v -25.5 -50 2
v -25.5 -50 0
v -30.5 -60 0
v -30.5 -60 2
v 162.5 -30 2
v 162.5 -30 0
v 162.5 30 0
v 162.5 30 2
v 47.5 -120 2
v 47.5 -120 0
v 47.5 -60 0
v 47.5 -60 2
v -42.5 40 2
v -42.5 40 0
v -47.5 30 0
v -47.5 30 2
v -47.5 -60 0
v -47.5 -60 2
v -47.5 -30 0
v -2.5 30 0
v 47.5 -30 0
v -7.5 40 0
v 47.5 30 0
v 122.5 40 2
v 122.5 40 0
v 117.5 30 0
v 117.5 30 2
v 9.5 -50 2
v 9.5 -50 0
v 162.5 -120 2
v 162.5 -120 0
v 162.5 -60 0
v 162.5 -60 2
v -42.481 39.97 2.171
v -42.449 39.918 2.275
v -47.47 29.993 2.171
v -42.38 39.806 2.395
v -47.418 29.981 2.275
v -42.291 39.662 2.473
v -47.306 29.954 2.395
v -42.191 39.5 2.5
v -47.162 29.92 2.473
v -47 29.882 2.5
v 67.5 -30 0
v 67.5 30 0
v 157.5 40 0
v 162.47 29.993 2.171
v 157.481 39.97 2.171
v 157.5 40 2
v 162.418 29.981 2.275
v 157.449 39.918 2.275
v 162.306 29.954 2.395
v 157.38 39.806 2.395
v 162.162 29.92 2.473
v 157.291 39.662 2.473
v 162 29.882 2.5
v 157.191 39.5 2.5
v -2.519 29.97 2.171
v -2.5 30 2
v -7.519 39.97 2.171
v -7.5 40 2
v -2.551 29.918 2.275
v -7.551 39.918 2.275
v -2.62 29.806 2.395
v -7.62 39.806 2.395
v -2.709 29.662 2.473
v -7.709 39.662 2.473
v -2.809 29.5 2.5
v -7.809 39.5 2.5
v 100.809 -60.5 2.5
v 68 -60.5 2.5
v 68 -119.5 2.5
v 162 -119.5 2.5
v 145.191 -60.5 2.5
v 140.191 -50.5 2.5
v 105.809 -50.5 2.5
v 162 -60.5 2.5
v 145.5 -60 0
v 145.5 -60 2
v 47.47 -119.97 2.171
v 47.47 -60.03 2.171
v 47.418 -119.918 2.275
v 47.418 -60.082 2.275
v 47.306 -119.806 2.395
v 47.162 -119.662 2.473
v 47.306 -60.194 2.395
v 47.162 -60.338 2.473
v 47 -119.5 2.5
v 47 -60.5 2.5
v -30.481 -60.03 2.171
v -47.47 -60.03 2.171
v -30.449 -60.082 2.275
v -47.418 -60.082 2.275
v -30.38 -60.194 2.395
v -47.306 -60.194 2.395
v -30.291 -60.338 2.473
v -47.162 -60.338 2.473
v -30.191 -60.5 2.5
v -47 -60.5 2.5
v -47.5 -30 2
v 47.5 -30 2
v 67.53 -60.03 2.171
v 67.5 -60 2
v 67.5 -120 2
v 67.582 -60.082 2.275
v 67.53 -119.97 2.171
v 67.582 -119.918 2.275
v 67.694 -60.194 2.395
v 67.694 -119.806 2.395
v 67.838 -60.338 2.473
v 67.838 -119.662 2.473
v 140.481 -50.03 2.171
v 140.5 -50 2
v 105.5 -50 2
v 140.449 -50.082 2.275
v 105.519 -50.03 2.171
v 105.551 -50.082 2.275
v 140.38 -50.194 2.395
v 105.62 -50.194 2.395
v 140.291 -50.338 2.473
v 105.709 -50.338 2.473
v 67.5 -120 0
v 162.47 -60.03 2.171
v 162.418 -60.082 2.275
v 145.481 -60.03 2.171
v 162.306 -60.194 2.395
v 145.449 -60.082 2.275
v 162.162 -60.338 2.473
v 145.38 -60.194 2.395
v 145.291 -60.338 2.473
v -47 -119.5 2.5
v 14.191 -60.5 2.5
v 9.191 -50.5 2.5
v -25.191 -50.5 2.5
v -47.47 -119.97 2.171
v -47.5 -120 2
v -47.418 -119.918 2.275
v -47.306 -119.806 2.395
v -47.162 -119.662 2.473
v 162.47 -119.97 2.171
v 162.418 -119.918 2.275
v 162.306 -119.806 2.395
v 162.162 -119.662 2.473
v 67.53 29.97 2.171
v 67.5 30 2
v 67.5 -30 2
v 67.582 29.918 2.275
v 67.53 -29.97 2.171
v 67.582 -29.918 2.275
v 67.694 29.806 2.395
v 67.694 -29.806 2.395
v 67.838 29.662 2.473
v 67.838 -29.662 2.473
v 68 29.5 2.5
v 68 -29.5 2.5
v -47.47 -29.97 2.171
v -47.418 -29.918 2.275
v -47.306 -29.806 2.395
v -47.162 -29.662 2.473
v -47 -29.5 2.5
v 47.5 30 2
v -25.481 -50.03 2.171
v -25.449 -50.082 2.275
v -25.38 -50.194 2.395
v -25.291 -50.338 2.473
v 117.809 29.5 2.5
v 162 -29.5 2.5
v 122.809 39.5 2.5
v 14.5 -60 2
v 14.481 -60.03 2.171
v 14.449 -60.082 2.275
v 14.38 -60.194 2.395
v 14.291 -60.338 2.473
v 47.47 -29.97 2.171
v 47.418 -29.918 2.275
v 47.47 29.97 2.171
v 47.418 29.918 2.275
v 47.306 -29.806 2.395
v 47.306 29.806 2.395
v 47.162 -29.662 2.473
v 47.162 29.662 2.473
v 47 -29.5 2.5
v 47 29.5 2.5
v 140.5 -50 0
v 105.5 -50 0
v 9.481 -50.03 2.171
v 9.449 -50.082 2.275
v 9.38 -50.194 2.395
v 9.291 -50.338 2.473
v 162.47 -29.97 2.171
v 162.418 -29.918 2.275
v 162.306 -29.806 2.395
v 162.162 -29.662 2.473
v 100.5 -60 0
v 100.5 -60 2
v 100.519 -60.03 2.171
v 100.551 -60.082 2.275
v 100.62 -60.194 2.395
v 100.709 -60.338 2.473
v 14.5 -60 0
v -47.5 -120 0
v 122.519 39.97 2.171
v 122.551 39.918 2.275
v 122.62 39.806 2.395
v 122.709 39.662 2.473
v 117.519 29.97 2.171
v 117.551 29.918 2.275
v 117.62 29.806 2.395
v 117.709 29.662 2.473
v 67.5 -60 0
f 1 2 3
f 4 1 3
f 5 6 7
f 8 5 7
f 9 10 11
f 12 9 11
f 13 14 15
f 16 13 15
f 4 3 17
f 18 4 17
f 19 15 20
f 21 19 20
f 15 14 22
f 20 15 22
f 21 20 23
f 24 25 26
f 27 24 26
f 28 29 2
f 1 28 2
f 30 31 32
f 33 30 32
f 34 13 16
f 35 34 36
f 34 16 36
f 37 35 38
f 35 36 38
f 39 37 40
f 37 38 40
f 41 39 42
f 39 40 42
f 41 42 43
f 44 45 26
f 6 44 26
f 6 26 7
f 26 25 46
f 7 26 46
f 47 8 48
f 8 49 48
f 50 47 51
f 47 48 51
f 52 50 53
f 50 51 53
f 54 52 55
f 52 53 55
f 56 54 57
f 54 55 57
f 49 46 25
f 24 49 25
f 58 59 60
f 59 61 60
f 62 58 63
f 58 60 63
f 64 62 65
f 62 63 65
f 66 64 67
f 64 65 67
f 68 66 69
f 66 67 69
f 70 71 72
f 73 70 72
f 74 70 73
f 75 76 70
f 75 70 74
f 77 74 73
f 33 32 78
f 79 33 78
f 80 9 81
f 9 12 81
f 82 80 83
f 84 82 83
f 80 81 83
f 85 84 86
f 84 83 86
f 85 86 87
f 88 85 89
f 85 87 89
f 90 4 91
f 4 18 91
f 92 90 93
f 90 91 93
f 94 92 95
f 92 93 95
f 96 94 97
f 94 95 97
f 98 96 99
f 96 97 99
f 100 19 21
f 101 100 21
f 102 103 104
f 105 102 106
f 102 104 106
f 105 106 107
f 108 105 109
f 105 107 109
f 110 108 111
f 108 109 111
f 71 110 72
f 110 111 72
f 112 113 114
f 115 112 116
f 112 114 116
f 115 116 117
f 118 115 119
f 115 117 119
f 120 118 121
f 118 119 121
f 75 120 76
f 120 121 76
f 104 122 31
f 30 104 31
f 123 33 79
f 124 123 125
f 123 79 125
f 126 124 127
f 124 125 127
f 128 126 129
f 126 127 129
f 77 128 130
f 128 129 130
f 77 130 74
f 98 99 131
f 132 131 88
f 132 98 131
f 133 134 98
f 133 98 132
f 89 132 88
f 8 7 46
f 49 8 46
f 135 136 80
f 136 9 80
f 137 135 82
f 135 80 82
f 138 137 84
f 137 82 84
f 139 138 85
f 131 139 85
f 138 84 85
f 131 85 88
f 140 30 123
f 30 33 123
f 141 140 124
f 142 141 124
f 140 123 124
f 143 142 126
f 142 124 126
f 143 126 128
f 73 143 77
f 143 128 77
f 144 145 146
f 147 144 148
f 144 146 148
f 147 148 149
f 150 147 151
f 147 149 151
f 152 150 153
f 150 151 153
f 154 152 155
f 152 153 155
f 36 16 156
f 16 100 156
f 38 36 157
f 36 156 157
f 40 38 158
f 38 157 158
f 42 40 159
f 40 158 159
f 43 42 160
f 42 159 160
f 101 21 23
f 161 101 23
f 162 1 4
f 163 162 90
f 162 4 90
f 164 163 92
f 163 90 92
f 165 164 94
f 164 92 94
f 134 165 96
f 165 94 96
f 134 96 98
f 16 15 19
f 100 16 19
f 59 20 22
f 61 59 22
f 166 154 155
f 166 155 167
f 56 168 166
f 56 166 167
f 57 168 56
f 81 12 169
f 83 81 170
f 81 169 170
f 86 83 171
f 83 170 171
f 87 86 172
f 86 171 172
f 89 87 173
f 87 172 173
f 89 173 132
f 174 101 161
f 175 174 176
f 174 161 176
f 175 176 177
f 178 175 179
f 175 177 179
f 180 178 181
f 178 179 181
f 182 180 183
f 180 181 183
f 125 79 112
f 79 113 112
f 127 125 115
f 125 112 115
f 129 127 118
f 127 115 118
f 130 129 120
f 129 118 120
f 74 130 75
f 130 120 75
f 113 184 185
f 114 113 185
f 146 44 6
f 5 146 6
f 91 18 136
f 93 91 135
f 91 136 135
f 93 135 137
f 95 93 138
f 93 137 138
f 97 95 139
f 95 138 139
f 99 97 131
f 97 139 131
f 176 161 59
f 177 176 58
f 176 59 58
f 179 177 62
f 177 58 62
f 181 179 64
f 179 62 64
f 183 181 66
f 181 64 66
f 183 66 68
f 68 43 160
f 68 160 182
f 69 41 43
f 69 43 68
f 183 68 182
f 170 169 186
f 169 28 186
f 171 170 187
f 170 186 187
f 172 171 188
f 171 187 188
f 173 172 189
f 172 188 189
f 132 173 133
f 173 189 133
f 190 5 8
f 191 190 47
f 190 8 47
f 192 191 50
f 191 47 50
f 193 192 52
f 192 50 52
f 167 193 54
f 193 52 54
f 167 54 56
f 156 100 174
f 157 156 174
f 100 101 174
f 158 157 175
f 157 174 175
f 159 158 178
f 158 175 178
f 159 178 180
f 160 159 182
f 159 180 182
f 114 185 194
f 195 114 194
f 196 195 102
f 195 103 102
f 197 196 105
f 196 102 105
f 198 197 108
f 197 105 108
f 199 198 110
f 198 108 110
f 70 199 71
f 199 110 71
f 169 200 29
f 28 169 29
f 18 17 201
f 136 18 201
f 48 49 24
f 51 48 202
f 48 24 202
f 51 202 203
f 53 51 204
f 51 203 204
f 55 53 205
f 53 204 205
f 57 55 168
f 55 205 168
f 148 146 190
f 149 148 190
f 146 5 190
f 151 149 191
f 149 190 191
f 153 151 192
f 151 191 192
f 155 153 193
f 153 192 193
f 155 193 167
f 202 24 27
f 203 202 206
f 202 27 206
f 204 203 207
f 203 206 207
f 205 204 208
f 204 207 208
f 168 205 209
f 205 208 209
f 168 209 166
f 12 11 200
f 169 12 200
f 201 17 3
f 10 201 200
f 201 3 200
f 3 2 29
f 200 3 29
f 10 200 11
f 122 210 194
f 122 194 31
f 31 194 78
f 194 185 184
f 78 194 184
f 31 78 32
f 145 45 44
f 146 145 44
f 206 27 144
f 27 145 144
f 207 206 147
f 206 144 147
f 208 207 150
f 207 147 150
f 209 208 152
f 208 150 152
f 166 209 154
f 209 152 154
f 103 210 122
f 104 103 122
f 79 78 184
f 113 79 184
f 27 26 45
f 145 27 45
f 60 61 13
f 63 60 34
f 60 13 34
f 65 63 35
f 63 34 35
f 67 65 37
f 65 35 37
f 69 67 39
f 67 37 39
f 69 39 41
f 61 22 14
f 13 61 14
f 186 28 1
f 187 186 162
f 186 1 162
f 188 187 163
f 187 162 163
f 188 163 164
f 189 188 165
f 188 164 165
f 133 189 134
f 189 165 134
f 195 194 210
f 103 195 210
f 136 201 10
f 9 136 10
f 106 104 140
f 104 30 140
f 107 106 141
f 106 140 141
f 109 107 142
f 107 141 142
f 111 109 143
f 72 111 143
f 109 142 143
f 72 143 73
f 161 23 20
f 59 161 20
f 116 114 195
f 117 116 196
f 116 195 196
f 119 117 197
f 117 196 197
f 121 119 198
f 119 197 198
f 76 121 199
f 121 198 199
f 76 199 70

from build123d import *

# Parameters (mm, degrees)
F1_DEPTH = 2.5
F2_R     = 0.5
F2_2_R   = 0.5
F2_3_R   = 0.5
F2_4_R   = 0.5


with BuildPart() as f1:
    # F0 (on Top) → F1 (new body)
    with BuildSketch(Plane.XY):
        Polygon((47.5, -30), (47.5, 30), (-2.5, 30), (-47.5, 30), (-47.5, -30), align=None)
        Polygon((-47.5, 30), (-2.5, 30), (-7.5, 40), (-42.5, 40), align=None)
    extrude(amount=F1_DEPTH)

    # F2
    f2_edges = [f1.edges().sort_by_distance(p)[0] for p in [
        (-45, 35, 2.5),
        (-25, 40, 2.5),
        (-5, 35, 2.5),
        (22.5, 30, 2.5),
        (47.5, 0, 2.5),
        (0, -30, 2.5),
        (-47.5, 0, 2.5),
    ]]
    fillet(f2_edges, radius=F2_R)


with BuildPart() as f1b:
    # F0 (on Top) → F1, piece 2 (new body)
    with BuildSketch(Plane.XY):
        Polygon((157.5, 40), (122.5, 40), (117.5, 30), (162.5, 30), align=None)
        Polygon((162.5, 30), (117.5, 30), (67.5, 30), (67.5, -30), (162.5, -30), align=None)
    extrude(amount=F1_DEPTH)

    # F2#2
    f2_2_edges = [f1b.edges().sort_by_distance(p)[0] for p in [
        (67.5, 0, 2.5),
        (92.5, 30, 2.5),
        (120, 35, 2.5),
        (140, 40, 2.5),
        (160, 35, 2.5),
        (162.5, 0, 2.5),
        (115, -30, 2.5),
    ]]
    fillet(f2_2_edges, radius=F2_2_R)


with BuildPart() as f1c:
    # F0 (on Top) → F1, piece 3 (new body)
    with BuildSketch(Plane.XY):
        Polygon((-47.5, -60), (-47.5, -120), (47.5, -120), (47.5, -60), (14.5, -60), (-30.5, -60), align=None)
        Polygon((-25.5, -50), (-30.5, -60), (14.5, -60), (9.5, -50), align=None)
    extrude(amount=F1_DEPTH)

    # F2#3
    f2_3_edges = [f1c.edges().sort_by_distance(p)[0] for p in [
        (-47.5, -90, 2.5),
        (-39, -60, 2.5),
        (-28, -55, 2.5),
        (-8, -50, 2.5),
        (12, -55, 2.5),
        (31, -60, 2.5),
        (47.5, -90, 2.5),
        (0, -120, 2.5),
    ]]
    fillet(f2_3_edges, radius=F2_3_R)


with BuildPart() as f1d:
    # F0 (on Top) → F1, piece 4 (new body)
    with BuildSketch(Plane.XY):
        Polygon((67.5, -120), (162.5, -120), (162.5, -60), (145.5, -60), (100.5, -60), (67.5, -60), align=None)
        Polygon((100.5, -60), (145.5, -60), (140.5, -50), (105.5, -50), align=None)
    extrude(amount=F1_DEPTH)

    # F2#4
    f2_4_edges = [f1d.edges().sort_by_distance(p)[0] for p in [
        (67.5, -90, 2.5),
        (84, -60, 2.5),
        (103, -55, 2.5),
        (123, -50, 2.5),
        (143, -55, 2.5),
        (154, -60, 2.5),
        (162.5, -90, 2.5),
        (115, -120, 2.5),
    ]]
    fillet(f2_4_edges, radius=F2_4_R)


solid = Compound([f1.part, f1b.part, f1c.part, f1d.part])
